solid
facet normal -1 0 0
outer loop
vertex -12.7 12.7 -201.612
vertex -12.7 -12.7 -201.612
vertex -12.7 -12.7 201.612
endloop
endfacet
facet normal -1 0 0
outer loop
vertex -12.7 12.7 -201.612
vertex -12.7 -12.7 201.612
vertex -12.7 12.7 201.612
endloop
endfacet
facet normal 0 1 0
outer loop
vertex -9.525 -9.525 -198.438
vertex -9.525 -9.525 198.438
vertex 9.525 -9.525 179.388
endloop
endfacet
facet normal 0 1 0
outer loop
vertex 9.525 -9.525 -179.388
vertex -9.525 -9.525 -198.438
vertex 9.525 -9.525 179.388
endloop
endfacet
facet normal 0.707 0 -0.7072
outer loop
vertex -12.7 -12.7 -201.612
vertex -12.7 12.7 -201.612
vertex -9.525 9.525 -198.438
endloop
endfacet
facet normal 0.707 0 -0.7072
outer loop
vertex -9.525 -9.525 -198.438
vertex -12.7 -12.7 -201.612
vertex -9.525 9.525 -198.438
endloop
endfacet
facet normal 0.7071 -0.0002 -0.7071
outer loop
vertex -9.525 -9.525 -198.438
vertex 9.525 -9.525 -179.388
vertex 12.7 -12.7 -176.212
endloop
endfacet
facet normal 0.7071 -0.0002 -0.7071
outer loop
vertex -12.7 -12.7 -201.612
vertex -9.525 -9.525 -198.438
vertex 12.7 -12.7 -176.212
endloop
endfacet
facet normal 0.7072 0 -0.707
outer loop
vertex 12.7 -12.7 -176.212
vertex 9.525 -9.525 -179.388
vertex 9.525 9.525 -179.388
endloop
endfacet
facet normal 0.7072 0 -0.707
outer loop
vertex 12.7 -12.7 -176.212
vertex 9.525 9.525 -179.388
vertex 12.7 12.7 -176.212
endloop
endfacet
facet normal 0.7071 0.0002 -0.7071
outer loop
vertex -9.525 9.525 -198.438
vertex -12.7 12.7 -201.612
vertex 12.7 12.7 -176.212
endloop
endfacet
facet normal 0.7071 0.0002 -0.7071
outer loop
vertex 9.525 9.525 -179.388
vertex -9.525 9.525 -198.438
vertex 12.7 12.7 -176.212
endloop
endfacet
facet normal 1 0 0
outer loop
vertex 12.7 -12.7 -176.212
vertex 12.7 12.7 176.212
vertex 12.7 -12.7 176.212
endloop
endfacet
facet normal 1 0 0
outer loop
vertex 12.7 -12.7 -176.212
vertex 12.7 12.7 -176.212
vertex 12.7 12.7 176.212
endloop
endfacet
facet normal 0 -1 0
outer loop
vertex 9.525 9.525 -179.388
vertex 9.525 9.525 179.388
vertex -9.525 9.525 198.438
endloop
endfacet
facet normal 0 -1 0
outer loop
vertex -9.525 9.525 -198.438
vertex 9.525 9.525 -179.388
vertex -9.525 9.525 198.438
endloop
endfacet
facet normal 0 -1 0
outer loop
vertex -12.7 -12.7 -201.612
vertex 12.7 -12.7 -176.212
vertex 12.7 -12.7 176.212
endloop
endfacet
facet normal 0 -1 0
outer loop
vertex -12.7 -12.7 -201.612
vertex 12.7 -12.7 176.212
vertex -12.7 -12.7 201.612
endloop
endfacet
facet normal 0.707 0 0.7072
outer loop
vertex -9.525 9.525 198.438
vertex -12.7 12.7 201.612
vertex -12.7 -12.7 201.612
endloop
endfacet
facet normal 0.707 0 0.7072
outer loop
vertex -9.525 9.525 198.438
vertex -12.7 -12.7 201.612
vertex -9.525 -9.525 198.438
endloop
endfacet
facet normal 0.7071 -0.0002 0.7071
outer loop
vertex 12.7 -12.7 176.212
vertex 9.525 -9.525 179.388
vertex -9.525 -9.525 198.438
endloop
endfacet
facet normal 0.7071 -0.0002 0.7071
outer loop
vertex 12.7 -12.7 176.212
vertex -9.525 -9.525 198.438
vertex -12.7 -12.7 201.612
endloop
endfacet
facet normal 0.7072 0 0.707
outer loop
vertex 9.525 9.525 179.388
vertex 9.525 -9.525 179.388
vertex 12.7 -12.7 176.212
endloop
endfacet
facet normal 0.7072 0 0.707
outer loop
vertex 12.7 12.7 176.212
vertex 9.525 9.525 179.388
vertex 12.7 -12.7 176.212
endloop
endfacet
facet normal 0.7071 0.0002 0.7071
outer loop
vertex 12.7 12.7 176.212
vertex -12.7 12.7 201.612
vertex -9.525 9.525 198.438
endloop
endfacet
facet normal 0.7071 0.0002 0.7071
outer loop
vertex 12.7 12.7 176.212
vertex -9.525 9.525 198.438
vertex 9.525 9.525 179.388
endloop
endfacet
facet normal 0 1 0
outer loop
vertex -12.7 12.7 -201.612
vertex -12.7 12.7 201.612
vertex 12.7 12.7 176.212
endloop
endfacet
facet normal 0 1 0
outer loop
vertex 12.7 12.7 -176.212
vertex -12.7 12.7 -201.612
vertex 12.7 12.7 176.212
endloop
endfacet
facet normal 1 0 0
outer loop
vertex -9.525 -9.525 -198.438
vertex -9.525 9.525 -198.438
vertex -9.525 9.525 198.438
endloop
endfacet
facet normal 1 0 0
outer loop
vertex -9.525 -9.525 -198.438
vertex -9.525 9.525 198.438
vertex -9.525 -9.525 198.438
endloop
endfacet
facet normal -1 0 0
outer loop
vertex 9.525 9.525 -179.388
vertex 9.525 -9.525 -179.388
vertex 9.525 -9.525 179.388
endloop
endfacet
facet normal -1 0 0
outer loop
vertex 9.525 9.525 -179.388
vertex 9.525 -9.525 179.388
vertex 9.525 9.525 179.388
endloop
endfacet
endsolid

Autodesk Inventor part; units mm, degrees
ref_plane "YZ Plane" through (0, 0, 0) normal (1, 0, 0) x (0, 1, 0)
ref_plane "XZ Plane" through (0, 0, 0) normal (0, 1, 0) x (-1, 0, 0)
ref_plane "XY Plane" through (0, 0, 0) normal (0, 0, 1) x (1, 0, 0)
sketch "Sketch1" plane through (0, 0, 0) normal (0, 0, 1) x (1, 0, 0)
  line L0 (-17.78, 0) -> (17.78, 0) projected
  line L1 (0, -17.78) -> (0, 17.78) projected
  line L2 (-12.7, 12.7) -> (12.7, 12.7)
  line L3 (12.7, 12.7) -> (12.7, -12.7)
  line L4 (12.7, -12.7) -> (-12.7, -12.7)
  line L5 (-12.7, -12.7) -> (-12.7, 12.7)
  line L6 (9.525, 9.525) -> (-9.525, 9.525)
  line L7 (-9.525, 9.525) -> (-9.525, -9.525)
  line L8 (-9.525, -9.525) -> (9.525, -9.525)
  line L9 (9.525, -9.525) -> (9.525, 9.525)
  point P0 (0, 0)
  point P1 (-12.7, 0)
  point P2 (0, 12.7)
  dimension "d0" = 25.4
  dimension "d1" = 3.175
extrude "Extrusion1" add sketch "Sketch1" along normal mid plane 403.225 contours L5 L2 L1 L6 L7 L0 | L0 L7 L8 L1 L4 L5 | L1 L8 L9 L0 L3 L4 | L2 L3 L0 L9 L6 L1
sketch "Sketch3" plane through (-12.7, 12.7, 201.6125) normal (0, 1, 0) x (1, 0, 0)
  line L0 (0, 0) -> (25.4, 0) projected
  line L1 (25.4, 0) -> (25.4, 403.225) projected
  line L2 (0, 0) -> (25.4, 25.4)
  point P0 (12.7, 201.6125)
  dimension "d7" = 45
extrude "Extrusion3" cut sketch "Sketch3" against normal through all
sketch "Sketch4" plane through (-12.7, 12.7, -201.6125) normal (0, 1, 0) x (1, 0, 0)
  line L0 (25.4, -377.825) -> (25.4, 0) projected
  line L1 (25.4, 0) -> (0, 0) projected
  line L2 (0, 0) -> (25.4, -25.4)
  point P0 (12.7, -201.6125)
  dimension "d10" = 45
extrude "Extrusion4" cut sketch "Sketch4" against normal through all
properties part number "tubing_template_0.125" material "Aluminum-6061"
